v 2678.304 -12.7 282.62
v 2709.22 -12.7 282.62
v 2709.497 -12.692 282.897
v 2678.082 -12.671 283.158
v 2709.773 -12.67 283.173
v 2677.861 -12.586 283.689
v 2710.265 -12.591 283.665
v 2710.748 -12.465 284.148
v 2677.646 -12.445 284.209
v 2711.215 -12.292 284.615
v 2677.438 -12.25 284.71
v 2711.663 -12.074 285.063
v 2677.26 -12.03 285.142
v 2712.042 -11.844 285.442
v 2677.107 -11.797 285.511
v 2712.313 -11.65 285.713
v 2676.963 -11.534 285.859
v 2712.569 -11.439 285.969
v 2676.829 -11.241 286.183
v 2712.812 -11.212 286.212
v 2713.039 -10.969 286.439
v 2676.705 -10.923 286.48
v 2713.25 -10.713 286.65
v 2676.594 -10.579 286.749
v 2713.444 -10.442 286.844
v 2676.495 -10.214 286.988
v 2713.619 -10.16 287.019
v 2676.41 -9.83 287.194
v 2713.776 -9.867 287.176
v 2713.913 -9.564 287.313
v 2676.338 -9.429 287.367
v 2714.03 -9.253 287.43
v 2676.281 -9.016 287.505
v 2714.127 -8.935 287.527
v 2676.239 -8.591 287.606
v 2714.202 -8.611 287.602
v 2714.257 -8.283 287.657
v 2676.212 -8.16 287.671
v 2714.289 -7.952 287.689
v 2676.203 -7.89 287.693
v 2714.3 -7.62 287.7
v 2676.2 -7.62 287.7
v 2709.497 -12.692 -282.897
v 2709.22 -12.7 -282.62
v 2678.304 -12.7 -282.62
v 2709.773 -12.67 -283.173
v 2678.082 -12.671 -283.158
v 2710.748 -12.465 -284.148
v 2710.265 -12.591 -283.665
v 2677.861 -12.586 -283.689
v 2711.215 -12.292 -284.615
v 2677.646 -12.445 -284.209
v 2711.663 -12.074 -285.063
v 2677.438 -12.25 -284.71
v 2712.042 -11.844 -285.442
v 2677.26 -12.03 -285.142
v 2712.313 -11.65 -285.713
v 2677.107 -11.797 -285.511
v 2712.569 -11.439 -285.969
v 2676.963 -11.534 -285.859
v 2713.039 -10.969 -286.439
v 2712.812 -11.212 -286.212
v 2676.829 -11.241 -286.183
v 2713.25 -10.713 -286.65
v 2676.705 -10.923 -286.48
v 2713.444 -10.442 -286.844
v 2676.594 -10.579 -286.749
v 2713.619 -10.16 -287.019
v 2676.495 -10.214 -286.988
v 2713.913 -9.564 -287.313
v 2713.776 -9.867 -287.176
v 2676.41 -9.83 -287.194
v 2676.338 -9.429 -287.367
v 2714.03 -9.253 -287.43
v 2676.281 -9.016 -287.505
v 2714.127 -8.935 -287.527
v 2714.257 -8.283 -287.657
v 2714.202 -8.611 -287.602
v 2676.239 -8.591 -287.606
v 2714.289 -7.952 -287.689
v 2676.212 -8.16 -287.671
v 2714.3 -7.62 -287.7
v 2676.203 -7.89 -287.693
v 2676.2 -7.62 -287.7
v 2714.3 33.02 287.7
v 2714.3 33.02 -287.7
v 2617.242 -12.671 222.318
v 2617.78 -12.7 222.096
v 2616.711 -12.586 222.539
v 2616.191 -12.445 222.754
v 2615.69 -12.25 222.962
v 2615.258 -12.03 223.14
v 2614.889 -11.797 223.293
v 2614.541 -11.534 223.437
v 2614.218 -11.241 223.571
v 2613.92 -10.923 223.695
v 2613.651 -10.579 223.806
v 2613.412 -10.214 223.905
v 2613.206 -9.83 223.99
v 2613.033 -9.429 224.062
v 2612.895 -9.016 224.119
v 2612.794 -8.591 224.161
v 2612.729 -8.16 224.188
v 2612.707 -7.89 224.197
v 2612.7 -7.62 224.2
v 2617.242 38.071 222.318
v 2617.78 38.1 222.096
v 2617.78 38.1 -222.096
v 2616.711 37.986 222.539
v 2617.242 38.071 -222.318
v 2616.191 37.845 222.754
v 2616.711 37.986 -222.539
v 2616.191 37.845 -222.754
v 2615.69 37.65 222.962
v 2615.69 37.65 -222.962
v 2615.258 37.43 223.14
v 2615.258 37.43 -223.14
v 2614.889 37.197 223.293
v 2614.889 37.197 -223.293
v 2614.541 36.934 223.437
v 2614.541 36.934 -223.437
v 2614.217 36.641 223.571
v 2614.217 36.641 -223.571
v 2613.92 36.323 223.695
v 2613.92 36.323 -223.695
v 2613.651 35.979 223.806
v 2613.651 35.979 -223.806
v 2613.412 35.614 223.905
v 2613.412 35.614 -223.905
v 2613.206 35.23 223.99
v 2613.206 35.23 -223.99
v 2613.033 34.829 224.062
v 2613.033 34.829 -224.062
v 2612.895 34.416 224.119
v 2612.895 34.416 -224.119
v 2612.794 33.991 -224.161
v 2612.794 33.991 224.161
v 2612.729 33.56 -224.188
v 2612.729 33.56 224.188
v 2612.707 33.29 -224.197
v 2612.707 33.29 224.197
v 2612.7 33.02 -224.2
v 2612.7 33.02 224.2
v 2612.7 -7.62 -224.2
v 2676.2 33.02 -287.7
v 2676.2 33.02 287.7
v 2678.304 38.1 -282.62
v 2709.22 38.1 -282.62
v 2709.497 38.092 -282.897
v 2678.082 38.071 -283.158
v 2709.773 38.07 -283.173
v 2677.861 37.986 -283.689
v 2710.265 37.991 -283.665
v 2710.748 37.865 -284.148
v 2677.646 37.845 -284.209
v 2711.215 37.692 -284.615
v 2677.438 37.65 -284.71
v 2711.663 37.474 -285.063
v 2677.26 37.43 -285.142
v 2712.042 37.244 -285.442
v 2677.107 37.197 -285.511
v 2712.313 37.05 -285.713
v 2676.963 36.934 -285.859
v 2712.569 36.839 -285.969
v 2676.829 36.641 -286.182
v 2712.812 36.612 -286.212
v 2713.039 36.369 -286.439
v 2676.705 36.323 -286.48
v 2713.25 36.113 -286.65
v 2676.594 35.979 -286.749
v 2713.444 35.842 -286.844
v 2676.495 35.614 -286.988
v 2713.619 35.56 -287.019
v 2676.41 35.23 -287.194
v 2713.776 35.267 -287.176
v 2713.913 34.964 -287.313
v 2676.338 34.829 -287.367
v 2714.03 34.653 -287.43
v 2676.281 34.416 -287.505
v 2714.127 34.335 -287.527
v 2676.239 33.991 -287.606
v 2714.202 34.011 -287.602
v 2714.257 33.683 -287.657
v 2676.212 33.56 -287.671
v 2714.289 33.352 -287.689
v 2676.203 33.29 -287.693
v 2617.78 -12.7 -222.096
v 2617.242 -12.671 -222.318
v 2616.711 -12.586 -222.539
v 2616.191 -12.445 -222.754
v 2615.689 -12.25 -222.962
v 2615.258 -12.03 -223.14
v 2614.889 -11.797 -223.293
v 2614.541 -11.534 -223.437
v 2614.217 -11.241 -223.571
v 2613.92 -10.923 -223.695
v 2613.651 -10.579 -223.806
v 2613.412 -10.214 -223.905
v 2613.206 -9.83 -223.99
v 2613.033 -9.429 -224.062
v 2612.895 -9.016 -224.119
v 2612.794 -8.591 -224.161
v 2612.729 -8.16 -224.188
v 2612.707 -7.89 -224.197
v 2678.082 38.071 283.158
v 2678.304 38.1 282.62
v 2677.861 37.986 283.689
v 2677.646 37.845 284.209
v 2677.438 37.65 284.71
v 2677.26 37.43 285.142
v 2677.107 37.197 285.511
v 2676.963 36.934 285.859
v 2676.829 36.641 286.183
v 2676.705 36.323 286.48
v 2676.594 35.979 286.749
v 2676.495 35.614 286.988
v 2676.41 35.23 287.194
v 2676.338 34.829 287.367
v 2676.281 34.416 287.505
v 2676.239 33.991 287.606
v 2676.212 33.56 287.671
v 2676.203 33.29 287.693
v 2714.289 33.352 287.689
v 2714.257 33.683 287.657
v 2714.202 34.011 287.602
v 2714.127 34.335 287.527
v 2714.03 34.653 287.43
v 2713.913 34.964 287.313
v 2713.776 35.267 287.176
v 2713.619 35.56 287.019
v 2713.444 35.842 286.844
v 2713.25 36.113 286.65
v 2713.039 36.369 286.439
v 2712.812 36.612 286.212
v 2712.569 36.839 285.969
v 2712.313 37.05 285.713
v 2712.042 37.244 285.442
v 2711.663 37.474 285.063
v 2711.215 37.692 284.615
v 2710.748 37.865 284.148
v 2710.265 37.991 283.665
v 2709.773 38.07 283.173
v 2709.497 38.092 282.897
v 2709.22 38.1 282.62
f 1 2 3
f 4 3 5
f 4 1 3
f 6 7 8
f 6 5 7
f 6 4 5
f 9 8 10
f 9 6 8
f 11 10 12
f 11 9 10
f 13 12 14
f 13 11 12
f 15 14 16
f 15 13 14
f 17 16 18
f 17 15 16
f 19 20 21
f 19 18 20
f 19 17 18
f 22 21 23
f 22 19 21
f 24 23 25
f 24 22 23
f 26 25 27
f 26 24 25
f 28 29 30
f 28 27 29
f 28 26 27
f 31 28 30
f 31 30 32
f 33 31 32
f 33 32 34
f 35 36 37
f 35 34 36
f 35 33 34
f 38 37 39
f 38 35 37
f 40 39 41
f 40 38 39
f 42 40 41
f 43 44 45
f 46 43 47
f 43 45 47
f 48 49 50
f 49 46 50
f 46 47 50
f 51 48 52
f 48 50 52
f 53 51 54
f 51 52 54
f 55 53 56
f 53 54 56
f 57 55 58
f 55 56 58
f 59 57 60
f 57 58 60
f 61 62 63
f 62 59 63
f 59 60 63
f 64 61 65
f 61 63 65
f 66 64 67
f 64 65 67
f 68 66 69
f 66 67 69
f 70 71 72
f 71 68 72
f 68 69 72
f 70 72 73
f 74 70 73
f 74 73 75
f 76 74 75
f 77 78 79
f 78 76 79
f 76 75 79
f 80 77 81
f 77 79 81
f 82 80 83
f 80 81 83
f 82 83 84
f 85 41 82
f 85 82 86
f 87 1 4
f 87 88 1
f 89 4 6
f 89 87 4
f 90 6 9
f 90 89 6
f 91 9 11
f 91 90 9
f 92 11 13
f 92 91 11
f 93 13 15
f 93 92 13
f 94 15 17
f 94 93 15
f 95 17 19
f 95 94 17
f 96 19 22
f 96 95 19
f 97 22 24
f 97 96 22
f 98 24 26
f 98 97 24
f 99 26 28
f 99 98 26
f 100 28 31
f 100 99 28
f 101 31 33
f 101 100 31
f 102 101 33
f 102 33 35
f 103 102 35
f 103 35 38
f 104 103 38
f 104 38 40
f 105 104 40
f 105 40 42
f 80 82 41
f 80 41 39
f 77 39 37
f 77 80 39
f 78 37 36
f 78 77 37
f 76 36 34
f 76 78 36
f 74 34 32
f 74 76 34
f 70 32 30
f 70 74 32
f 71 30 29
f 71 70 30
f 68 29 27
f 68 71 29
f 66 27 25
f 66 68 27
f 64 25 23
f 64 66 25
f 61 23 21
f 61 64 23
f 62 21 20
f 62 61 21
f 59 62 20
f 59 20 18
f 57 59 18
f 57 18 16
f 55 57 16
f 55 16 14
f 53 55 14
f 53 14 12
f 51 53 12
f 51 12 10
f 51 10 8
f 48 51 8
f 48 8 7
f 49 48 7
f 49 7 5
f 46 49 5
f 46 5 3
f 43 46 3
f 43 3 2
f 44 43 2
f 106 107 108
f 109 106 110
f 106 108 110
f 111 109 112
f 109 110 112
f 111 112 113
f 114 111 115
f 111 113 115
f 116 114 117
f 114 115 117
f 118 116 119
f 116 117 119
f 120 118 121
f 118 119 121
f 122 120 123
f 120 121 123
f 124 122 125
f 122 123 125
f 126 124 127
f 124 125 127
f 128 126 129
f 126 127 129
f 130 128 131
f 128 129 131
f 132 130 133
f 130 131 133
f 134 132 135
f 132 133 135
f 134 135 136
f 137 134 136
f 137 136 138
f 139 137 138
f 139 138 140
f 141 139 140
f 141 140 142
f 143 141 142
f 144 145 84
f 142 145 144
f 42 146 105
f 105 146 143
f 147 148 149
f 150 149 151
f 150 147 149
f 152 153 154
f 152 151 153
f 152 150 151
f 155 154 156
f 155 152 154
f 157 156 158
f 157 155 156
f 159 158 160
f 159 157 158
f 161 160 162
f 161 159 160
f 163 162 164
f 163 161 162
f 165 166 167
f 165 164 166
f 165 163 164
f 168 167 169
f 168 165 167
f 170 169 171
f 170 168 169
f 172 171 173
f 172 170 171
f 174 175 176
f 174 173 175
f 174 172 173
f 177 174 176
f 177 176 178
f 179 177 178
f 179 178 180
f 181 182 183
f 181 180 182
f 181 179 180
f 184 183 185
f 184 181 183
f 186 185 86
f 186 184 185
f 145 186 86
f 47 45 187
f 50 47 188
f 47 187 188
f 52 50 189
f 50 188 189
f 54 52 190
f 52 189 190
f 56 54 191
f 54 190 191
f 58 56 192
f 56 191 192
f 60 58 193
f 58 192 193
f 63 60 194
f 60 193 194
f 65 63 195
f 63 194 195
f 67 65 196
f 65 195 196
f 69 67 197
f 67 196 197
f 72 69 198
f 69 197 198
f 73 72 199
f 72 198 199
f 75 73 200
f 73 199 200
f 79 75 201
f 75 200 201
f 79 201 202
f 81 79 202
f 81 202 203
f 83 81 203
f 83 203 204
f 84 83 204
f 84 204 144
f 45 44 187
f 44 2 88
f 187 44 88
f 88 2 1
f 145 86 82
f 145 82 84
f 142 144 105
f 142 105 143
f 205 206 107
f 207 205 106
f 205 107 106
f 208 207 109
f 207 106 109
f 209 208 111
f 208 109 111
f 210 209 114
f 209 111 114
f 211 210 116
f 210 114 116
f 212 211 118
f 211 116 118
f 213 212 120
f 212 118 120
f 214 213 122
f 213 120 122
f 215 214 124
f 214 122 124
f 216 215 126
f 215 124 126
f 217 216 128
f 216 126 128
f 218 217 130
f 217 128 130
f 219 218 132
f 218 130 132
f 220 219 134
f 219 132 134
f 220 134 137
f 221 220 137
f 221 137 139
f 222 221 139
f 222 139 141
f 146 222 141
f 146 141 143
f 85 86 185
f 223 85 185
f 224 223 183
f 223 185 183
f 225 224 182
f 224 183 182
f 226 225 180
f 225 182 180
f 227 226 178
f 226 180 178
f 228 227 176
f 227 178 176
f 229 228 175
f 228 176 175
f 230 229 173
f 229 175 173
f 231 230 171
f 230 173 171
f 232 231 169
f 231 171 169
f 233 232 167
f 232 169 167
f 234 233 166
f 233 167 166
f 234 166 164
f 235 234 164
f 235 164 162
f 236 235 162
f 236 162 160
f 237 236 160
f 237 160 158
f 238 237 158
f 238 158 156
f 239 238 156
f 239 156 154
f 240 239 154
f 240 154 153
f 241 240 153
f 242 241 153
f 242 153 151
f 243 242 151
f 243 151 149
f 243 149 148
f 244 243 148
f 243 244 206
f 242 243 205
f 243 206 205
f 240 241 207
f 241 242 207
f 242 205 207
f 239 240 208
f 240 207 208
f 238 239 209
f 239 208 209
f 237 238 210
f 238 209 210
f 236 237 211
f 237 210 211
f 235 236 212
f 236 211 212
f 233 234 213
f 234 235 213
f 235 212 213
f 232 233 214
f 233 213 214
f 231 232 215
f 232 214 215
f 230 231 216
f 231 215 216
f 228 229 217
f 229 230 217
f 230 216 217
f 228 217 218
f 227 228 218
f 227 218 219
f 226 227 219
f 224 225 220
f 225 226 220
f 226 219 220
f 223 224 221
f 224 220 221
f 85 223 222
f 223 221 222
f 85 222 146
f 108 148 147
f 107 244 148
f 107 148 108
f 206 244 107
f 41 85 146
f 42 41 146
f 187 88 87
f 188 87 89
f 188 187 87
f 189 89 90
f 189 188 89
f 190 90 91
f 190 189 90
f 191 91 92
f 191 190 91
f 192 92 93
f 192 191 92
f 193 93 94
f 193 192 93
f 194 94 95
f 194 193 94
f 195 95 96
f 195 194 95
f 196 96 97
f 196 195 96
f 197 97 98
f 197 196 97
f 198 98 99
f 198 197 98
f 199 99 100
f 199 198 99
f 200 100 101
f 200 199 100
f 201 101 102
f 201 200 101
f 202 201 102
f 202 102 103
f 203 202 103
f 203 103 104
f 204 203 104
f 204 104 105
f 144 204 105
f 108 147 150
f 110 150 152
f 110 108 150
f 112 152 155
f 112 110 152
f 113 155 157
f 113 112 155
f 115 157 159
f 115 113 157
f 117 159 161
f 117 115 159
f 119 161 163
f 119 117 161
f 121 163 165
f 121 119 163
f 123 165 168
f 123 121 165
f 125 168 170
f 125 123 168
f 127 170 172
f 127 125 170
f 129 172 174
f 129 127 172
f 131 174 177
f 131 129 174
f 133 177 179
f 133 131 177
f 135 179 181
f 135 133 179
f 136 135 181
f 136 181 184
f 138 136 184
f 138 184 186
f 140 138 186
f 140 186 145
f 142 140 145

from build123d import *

# Parameters (mm, degrees)
SKETCH2_W           = 101.6
SKETCH2_H           = 50.8
BOSS_EXTRUDE1_DEPTH = 575.4
CUT_EXTRUDE1_DEPTH  = 51.8
FILLET1_R           = 5.08


with BuildPart() as part:
    # Sketch2 → Boss-Extrude1 (new body)
    with BuildSketch(Plane(origin=(0, 0, 287.7), x_dir=(-1, 0, 0), z_dir=(0, 0, -1))):
        with Locations((-2663.5, 12.7)):
            Rectangle(SKETCH2_W, SKETCH2_H)
    extrude(amount=BOSS_EXTRUDE1_DEPTH)

    # Sketch5 → Cut-Extrude1 (cut, through all)
    with BuildSketch(Plane(origin=(0, 38.1, 0), x_dir=(1, 0, 0), z_dir=(0, 1, 0))):
        Polygon((2612.7, -287.7), (2676.2, -287.7), (2612.7, -224.2), align=None)
        Polygon((2676.2, 287.7), (2612.7, 224.2), (2612.7, 287.7), align=None)
    extrude(amount=-CUT_EXTRUDE1_DEPTH, mode=Mode.SUBTRACT)

    # Fillet1
    fillet1_edges = [part.edges().sort_by_distance(p)[0] for p in [
        (2714.3, 38.1, 0),
        (2695.25, 38.1, -287.7),
        (2714.3, -12.7, 0),
        (2695.25, -12.7, -287.7),
        (2612.7, -12.7, 0),
        (2612.7, 38.1, 0),
        (2695.25, 38.1, 287.7),
        (2644.45, -12.7, -255.95),
        (2644.45, 38.1, -255.95),
        (2644.45, -12.7, 255.95),
        (2644.45, 38.1, 255.95),
        (2695.25, -12.7, 287.7),
    ]]
    fillet(fillet1_edges, radius=FILLET1_R)


solid = part.part
